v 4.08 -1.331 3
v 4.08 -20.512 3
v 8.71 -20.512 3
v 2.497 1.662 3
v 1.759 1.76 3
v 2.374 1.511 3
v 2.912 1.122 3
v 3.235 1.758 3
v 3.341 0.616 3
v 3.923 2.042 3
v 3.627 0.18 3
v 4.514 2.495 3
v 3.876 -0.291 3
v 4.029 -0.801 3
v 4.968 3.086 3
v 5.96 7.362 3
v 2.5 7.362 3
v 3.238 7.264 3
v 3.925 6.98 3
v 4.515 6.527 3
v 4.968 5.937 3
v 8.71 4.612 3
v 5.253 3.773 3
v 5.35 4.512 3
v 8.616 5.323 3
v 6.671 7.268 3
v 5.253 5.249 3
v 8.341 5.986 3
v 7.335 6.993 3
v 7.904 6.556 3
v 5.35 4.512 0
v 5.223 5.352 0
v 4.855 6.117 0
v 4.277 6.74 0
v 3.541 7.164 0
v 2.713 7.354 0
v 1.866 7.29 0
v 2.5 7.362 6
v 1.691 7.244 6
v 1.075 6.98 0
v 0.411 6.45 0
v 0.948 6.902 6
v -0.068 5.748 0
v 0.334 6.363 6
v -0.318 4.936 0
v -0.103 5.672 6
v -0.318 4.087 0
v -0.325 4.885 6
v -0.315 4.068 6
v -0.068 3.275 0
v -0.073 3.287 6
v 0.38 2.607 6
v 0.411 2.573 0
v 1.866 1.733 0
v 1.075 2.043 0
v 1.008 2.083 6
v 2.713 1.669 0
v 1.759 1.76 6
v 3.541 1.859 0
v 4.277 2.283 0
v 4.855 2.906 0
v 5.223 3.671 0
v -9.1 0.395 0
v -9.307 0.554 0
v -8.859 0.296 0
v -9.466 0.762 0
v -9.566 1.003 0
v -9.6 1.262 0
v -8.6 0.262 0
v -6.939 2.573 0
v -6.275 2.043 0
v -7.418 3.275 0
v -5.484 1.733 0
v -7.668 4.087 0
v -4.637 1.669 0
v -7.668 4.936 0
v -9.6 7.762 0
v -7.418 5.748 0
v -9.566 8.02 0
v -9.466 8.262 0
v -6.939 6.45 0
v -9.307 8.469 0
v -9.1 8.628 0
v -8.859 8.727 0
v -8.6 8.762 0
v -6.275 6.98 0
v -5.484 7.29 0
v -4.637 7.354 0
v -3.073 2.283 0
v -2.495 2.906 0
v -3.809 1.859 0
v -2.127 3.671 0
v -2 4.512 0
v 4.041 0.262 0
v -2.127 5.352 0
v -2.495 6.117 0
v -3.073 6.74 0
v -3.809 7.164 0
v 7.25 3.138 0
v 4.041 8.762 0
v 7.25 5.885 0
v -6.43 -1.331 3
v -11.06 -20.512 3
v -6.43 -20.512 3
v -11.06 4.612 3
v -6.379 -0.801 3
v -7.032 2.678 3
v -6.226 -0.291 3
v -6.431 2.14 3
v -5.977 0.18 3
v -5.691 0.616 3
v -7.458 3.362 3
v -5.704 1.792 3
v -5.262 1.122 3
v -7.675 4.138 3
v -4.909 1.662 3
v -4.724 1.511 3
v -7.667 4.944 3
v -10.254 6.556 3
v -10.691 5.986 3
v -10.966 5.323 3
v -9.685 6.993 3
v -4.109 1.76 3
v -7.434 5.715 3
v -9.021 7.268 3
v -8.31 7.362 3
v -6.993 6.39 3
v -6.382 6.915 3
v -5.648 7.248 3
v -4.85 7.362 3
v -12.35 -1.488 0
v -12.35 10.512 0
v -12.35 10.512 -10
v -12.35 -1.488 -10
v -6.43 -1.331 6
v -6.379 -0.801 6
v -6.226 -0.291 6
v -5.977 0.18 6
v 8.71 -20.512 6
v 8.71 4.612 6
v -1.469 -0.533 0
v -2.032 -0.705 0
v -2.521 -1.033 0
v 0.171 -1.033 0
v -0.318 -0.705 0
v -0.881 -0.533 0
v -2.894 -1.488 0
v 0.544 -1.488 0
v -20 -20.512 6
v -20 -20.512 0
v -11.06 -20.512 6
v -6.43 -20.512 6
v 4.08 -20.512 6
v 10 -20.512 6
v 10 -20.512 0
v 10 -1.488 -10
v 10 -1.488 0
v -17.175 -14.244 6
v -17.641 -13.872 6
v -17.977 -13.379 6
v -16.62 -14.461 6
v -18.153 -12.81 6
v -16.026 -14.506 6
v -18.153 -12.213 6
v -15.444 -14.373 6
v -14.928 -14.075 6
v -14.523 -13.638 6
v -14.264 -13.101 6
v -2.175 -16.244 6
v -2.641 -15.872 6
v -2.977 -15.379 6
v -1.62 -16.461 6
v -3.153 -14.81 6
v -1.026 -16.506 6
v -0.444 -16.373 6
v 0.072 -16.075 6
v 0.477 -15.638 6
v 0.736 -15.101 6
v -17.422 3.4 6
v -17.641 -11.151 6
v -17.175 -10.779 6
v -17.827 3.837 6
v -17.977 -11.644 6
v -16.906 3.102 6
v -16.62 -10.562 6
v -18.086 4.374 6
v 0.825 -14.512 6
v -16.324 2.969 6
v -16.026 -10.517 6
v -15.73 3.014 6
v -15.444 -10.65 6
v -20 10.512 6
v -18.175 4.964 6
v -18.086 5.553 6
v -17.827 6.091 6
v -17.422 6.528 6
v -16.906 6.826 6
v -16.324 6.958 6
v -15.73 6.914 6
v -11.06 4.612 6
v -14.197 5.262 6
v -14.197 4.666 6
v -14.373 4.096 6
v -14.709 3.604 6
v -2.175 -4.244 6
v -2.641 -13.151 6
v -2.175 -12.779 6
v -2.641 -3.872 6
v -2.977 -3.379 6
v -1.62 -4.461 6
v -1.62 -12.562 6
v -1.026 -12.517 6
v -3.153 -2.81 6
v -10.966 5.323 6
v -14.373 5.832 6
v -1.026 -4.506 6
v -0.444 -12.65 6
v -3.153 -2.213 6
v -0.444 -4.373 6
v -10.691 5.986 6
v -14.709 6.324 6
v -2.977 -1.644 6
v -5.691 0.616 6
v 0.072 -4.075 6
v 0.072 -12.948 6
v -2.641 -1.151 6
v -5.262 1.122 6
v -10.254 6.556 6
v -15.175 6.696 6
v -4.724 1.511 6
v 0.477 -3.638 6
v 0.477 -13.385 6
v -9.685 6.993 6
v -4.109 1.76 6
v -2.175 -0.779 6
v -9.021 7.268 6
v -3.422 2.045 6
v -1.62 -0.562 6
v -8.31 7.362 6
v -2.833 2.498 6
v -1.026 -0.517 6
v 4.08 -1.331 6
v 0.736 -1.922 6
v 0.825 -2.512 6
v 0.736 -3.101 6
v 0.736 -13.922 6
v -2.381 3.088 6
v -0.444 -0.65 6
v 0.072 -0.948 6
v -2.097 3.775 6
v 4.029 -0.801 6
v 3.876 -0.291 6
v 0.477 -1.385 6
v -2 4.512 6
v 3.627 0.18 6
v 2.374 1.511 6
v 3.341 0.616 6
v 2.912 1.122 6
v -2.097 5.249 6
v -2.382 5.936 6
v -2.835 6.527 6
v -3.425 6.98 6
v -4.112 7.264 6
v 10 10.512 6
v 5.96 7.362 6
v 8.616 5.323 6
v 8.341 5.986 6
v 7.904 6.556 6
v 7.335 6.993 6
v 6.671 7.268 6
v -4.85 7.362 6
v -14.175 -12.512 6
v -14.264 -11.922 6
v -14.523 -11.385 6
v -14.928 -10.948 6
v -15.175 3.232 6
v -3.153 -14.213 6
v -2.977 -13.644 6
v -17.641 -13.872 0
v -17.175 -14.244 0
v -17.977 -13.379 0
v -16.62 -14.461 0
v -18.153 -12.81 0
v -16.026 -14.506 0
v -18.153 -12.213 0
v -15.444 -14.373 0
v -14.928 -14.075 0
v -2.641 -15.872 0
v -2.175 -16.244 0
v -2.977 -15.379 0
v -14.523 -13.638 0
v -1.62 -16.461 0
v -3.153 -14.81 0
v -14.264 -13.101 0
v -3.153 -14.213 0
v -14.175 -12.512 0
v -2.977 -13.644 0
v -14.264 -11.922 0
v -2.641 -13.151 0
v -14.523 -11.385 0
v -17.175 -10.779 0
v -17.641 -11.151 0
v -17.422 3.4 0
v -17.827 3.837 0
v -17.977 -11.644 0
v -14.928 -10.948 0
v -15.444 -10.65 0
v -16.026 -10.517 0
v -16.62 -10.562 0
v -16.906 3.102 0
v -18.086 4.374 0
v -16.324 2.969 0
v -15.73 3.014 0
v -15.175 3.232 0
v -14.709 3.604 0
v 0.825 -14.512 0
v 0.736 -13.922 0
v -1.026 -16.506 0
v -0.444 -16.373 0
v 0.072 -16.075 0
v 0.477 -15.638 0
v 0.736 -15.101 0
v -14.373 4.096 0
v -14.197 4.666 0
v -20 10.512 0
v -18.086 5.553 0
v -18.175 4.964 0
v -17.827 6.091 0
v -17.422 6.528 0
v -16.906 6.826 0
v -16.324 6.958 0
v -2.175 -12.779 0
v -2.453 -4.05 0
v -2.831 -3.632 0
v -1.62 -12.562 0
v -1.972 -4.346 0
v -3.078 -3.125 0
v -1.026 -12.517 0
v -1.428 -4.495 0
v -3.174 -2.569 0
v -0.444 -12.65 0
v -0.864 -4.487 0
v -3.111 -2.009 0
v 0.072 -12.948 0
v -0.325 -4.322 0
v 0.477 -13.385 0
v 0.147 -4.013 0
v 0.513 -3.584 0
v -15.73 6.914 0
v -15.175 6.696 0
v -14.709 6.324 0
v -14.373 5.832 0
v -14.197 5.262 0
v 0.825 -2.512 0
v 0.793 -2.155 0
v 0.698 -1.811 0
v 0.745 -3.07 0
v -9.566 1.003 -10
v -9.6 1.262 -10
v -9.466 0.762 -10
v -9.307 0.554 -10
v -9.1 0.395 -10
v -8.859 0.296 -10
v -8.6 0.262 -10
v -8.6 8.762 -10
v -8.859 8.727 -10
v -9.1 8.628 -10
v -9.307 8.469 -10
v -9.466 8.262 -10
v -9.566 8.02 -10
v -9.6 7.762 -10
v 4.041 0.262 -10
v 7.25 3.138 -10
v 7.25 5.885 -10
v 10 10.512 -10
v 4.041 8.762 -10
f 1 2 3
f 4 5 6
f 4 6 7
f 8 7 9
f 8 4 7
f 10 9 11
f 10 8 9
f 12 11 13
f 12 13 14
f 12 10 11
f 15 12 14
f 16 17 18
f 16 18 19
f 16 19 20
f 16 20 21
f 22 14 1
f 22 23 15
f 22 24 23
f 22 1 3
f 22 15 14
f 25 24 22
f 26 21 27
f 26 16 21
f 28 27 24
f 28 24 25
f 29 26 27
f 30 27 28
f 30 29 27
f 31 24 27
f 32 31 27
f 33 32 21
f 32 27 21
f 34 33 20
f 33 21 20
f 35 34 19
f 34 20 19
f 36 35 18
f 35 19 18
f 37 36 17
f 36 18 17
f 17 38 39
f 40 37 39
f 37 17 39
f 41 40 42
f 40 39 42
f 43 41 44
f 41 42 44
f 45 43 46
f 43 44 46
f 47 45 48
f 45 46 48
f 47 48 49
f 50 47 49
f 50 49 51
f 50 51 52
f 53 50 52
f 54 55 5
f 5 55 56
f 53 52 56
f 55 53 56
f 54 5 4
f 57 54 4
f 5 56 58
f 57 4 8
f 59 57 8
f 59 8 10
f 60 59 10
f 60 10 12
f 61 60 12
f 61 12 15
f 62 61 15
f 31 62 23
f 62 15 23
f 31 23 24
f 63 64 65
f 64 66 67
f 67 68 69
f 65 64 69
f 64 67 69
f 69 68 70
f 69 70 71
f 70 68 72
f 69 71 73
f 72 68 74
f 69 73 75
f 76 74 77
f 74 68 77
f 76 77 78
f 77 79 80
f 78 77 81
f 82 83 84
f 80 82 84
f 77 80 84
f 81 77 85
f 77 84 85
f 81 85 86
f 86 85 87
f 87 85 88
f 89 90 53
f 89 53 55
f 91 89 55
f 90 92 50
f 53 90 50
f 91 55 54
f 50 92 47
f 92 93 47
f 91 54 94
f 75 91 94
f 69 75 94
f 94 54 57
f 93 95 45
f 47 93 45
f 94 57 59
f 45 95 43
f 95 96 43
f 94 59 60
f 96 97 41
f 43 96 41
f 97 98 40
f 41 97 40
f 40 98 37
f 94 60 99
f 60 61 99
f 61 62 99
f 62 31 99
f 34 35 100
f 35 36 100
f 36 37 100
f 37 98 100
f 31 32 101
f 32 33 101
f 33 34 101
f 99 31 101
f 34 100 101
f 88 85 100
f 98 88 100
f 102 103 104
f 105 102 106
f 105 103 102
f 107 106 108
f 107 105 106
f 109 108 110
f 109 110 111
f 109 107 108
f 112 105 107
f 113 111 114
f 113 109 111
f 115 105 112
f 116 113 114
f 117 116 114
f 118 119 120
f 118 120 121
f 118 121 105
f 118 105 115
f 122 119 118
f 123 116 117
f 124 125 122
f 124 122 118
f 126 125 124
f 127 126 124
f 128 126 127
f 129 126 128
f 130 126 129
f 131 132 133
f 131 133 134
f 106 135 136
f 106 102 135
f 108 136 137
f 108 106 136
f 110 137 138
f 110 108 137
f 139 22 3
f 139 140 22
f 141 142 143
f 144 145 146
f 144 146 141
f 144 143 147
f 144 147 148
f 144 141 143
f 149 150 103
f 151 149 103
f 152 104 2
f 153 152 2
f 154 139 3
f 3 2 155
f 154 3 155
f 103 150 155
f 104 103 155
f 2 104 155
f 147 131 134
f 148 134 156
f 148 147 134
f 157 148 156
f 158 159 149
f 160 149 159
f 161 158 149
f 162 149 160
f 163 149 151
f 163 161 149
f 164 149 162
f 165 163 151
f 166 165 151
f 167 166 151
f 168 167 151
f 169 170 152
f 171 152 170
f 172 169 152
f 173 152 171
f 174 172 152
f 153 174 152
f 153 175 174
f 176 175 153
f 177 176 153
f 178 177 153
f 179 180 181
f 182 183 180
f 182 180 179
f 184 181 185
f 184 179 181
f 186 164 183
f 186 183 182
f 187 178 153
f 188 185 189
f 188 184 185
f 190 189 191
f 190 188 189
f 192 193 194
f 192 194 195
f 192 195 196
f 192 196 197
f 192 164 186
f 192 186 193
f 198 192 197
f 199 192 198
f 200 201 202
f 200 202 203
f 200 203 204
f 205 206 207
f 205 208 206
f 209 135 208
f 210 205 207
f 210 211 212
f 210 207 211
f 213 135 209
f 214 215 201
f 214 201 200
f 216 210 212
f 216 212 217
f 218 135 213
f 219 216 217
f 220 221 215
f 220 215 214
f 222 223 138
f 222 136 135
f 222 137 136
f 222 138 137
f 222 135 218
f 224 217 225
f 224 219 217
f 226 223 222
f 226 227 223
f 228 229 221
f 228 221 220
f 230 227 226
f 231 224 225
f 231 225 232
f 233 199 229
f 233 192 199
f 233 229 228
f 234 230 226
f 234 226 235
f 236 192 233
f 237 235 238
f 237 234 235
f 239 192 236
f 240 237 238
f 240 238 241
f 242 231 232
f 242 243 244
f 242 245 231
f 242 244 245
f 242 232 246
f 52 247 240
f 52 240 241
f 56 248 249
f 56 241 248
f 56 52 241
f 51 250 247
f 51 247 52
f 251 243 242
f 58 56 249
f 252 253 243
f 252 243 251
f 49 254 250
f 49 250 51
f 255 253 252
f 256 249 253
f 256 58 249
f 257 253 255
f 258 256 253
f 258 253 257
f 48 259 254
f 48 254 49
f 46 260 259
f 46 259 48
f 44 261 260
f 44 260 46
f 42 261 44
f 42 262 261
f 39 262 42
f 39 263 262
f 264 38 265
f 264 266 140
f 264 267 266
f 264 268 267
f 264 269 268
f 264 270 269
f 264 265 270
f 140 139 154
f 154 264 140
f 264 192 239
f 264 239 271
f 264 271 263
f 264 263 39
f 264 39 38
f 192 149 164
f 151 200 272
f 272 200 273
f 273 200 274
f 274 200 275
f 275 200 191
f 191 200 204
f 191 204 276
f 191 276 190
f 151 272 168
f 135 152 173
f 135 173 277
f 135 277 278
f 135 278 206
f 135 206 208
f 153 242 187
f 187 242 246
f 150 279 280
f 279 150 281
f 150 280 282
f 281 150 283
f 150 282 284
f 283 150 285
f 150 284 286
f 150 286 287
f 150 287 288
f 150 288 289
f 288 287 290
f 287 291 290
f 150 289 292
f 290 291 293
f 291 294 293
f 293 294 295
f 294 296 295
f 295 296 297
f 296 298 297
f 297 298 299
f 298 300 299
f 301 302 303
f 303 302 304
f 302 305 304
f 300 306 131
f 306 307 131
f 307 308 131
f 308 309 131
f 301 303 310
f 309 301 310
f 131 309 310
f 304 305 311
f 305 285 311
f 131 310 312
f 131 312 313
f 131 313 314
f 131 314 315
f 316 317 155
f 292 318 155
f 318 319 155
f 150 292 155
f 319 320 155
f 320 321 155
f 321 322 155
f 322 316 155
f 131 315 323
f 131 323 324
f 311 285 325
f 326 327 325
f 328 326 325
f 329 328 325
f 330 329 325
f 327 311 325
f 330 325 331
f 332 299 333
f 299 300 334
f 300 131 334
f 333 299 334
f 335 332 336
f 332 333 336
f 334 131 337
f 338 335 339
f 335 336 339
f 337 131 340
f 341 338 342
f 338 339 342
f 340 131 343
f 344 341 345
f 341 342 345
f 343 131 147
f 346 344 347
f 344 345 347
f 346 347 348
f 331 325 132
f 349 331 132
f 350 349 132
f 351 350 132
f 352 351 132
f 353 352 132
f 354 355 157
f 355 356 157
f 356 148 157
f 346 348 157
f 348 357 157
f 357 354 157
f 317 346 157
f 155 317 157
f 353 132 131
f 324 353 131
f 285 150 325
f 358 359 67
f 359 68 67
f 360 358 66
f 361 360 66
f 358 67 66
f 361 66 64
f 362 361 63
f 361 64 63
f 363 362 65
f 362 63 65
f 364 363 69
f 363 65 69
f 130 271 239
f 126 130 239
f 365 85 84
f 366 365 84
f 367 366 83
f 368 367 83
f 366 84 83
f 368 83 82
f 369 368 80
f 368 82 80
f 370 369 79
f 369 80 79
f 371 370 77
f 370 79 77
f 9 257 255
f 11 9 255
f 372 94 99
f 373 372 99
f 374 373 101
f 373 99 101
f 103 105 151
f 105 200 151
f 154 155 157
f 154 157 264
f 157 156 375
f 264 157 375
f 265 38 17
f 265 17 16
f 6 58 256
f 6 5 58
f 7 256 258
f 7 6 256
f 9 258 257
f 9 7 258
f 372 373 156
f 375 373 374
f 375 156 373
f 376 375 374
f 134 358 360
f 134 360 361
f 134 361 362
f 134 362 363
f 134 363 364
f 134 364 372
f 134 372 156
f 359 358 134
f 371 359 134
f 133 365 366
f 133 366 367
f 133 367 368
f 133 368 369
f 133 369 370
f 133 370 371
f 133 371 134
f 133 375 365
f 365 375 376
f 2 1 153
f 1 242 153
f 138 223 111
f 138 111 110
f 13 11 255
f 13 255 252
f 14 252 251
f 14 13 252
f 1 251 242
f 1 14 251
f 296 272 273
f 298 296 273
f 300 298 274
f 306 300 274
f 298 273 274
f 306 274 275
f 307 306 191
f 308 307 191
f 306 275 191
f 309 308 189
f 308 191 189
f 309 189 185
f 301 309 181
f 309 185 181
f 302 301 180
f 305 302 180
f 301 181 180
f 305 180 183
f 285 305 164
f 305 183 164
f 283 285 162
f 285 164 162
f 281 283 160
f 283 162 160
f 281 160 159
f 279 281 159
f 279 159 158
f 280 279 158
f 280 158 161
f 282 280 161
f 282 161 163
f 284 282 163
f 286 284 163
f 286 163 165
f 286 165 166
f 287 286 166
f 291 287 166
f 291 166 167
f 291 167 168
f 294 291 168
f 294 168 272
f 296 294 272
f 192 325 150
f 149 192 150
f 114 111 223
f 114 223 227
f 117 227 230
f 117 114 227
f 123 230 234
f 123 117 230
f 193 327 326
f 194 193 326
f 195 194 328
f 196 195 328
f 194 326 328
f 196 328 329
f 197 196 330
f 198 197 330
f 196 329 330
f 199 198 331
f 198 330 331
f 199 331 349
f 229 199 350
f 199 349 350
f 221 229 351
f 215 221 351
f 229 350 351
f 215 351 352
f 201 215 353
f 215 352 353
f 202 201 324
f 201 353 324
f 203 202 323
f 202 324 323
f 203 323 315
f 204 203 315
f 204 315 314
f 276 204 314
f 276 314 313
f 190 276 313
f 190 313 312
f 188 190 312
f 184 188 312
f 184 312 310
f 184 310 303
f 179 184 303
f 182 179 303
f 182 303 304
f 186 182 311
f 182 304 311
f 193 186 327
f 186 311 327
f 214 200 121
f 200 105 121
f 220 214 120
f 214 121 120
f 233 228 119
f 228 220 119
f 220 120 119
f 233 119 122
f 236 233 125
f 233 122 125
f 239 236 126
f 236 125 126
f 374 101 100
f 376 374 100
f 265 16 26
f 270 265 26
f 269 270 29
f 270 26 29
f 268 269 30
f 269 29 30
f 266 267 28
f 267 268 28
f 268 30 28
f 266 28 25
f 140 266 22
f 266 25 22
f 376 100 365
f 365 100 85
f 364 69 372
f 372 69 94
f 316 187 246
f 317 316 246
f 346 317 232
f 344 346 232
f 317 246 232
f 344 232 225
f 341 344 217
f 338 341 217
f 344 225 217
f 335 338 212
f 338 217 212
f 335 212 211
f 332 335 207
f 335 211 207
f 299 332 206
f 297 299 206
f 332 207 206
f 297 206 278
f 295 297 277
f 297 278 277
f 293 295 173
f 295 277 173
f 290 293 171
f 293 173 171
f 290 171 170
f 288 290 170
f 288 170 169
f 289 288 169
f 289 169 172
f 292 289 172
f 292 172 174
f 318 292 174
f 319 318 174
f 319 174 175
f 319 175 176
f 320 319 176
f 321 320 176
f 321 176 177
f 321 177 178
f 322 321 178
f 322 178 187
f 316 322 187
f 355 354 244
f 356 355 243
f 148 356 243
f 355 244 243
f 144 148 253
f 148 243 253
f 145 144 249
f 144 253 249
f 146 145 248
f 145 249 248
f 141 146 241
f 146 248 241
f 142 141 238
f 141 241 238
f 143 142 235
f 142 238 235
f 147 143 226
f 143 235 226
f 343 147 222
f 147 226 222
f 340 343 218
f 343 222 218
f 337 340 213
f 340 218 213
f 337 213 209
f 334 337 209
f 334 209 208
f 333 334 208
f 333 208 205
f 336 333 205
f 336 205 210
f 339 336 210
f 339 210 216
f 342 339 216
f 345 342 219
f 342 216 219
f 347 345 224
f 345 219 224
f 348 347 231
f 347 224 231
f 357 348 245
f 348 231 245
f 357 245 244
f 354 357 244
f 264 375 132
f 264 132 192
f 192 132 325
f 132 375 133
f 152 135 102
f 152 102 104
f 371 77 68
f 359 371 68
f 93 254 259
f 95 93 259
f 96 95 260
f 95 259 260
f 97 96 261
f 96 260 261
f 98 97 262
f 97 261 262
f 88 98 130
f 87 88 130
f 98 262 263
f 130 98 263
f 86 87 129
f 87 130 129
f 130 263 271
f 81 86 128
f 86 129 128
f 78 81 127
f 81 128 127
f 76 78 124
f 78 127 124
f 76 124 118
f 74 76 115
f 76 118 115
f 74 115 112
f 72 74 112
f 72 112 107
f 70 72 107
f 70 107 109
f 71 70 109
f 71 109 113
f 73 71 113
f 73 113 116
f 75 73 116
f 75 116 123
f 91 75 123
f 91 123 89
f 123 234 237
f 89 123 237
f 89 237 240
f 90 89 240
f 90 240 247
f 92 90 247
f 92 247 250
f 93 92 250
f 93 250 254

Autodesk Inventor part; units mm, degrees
ref_plane "YZ Plane" through (0, 0, 0) normal (1, 0, 0) x (0, 1, 0)
ref_plane "XZ Plane" through (0, 0, 0) normal (0, 1, 0) x (-1, 0, 0)
ref_plane "XY Plane" through (0, 0, 0) normal (0, 0, 1) x (1, 0, 0)
sketch "Эскиз1" plane through (0, 0, 0) normal (0, 0, 1) x (1, 0, 0)
  line L0 (-10, -10.5115) -> (10, -10.5115)
  line L1 (10, -10.5115) -> (10, 10.5115)
  line L2 (10, 10.5115) -> (-10, 10.5115)
  line L3 (-10, 10.5115) -> (-10, -10.5115)
  line L4 (-10, -10.5115) -> (10, 10.5115) construction
  line L5 (10, -10.5115) -> (-10, 10.5115) construction
  point P0 (0, 0)
  dimension "d0" = 20
  dimension "d1" = 21.023
extrude "Выдавливание1" add sketch "Эскиз1" along normal blind 6
sketch "Эскиз2" plane through (0, 0, 6) normal (0, 0, 1) x (1, 0, 0)
  circle A0 centre (2.5, 4.5115) radius 2.85 projected
  circle A1 centre (-4.85, 4.5115) radius 2.85 projected
  point P0 (0, 0)
extrude "Выдавливание2" cut sketch "Эскиз2" against normal blind 6
move faces "Перенос1" translate (-10, 0, 0) faces at (-10, 3.5038, 2)
move faces "Перенос2" translate (0, -10, 0) faces at (-10, -10.5115, 2)
sketch "Эскиз4" plane through (0, 0, 0) normal (0, 0, -1) x (-1, 0, 0)
  line L0 (8.6, 0.7615) -> (-3.85, 0.7615) projected
  arc A0 (8.6, 0.7615) -> (9.1, 1.2615) centre (8.6, 1.2615) ccw projected
  line L1 (9.1, 7.7615) -> (9.1, 1.2615) projected
  line L2 (-3.85, 8.2615) -> (8.6, 8.2615) projected
  arc A1 (9.1, 7.7615) -> (8.6, 8.2615) centre (8.6, 7.7615) ccw projected
  line L3 (-6.75, 5.6615) -> (-3.85, 8.2615) projected
  line L4 (-6.75, 3.3615) -> (-6.75, 5.6615) projected
  line L5 (-3.85, 0.7615) -> (-6.75, 3.3615) projected
  line L6 (-10, 10.5115) -> (20, 10.5115) projected
  line L7 (-10, 10.5115) -> (12.35, 10.5115)
  line L8 (12.35, 10.5115) -> (12.35, -1.4885)
  line L9 (12.35, -1.4885) -> (-10, -1.4885)
  line L10 (-10, -1.4885) -> (-10, 10.5115)
  point P0 (0, 0)
  dimension "d19" = 2.25
  dimension "d20" = 2.25
  dimension "d21" = 3.25
  dimension "d23" = 3.25
extrude "Выдавливание4" add sketch "Эскиз4" along normal blind 10
offset faces "Размер1" outward -0.5 faces at (-0.3, 8.2615, -3.3333) (-8.9665, 8.1016, -6.6667) (-9.1, 5.5948, -3.3333) (5.7833, 6.5282, -3.3333) (6.75, 4.1282, -3.3333) (4.8167, 1.6282, -3.3333) (-4.45, 0.7615, -3.3333) (-8.7474, 0.7837, -6.6667)
sketch "Эскиз5" plane through (0, 0, 0) normal (0, 0, -1) x (-1, 0, 0)
  circle A0 centre (16.175, 4.9639) radius 2
  line L0 (12.35, 10.5115) -> (20, 10.5115) projected
  point P0 (0, 0)
  point P1 (16.175, 10.5115)
  dimension "d27" = 4
extrude "Выдавливание5" cut sketch "Эскиз5" against normal blind 10
sketch "Эскиз6" plane through (0, 0, 6) normal (0, 0, 1) x (1, 0, 0)
  circle A0 centre (-16.175, -12.5115) radius 2
  circle A1 centre (-16.175, 4.9639) radius 2 projected
  circle A2 centre (-1.1985, -0.3999) radius 2
  line L0 (-20, -20.5115) -> (10, -20.5115) projected
  point P0 (0, 0)
  dimension "d30" = 4
  dimension "d31" = 4
  dimension "d46" = 8
extrude "Выдавливание6" cut sketch "Эскиз6" against normal blind 6.5 contours A0
sketch "Эскиз7" plane through (0, 0, 6) normal (0, 0, 1) x (1, 0, 0)
  circle A0 centre (-4.85, 4.5115) radius 2.85 projected
  line L0 (-4.85, 7.3615) -> (-11.0596, 7.3615)
  line L1 (-11.0596, 7.3615) -> (-11.0596, -20.5115)
  line L2 (-20, -20.5115) -> (10, -20.5115) projected
  line L3 (-5, 1.6655) -> (-6.4302, -0.5077)
  line L4 (-6.4302, -0.5077) -> (-6.4302, -20.5115)
  line L5 (10, 10.5115) -> (-20, 10.5115) projected
  line L6 (-1.175, 10.5115) -> (-1.175, 2.4545) construction
  circle A1 centre (2.5, 4.5115) radius 2.85 projected
  line L7 (-4.85, 4.5115) -> (-4.85, 5.527) construction
  line L8 (2.5, 4.5115) -> (2.5, 5.527) construction
  line L9 (2.5, 7.3615) -> (8.7096, 7.3615)
  line L10 (8.7096, 7.3615) -> (8.7096, -20.5115)
  line L11 (2.65, 1.6655) -> (4.0802, -0.5077)
  line L12 (4.0802, -0.5077) -> (4.0802, -20.5115)
  point P0 (0, 0)
extrude "Выдавливание7" cut sketch "Эскиз7" against normal blind 3 contours A0 L3 L4 L2 L1 L0 | L12 L11 A1 L9 L10 L2
fillet "Сопряжение2" radius 2.75 6 edges at (8.7096, 7.3615, 4.5) (2.65, 1.6655, 4.5) (4.0802, -0.5077, 4.5) (-5, 1.6655, 4.5) (-6.4302, -0.5077, 4.5) (-11.0596, 7.3615, 4.5)
sketch "Эскиз8" plane through (0, 0, 6) normal (0, 0, 1) x (1, 0, 0)
  circle A0 centre (-1.175, -2.5115) radius 2
  circle A1 centre (-1.175, -14.5115) radius 2
  line L0 (-6.4302, -20.5115) -> (4.0802, -20.5115) projected
  circle A2 centre (-1.175, -2.5115) radius 3 construction
  point P0 (0, 0)
  point P1 (-1.175, -20.5115)
  dimension "d39" = 4
  dimension "d40" = 4
  dimension "d41" = 6
  dimension "d42" = 12
  dimension "d43" = 6
extrude "Выдавливание8" cut sketch "Эскиз8" against normal up to surface (6 mm away)
equation "\"d20\" = d19"
equation "\"d23\" = d21"
properties part number "000.012.001 - Основание"
